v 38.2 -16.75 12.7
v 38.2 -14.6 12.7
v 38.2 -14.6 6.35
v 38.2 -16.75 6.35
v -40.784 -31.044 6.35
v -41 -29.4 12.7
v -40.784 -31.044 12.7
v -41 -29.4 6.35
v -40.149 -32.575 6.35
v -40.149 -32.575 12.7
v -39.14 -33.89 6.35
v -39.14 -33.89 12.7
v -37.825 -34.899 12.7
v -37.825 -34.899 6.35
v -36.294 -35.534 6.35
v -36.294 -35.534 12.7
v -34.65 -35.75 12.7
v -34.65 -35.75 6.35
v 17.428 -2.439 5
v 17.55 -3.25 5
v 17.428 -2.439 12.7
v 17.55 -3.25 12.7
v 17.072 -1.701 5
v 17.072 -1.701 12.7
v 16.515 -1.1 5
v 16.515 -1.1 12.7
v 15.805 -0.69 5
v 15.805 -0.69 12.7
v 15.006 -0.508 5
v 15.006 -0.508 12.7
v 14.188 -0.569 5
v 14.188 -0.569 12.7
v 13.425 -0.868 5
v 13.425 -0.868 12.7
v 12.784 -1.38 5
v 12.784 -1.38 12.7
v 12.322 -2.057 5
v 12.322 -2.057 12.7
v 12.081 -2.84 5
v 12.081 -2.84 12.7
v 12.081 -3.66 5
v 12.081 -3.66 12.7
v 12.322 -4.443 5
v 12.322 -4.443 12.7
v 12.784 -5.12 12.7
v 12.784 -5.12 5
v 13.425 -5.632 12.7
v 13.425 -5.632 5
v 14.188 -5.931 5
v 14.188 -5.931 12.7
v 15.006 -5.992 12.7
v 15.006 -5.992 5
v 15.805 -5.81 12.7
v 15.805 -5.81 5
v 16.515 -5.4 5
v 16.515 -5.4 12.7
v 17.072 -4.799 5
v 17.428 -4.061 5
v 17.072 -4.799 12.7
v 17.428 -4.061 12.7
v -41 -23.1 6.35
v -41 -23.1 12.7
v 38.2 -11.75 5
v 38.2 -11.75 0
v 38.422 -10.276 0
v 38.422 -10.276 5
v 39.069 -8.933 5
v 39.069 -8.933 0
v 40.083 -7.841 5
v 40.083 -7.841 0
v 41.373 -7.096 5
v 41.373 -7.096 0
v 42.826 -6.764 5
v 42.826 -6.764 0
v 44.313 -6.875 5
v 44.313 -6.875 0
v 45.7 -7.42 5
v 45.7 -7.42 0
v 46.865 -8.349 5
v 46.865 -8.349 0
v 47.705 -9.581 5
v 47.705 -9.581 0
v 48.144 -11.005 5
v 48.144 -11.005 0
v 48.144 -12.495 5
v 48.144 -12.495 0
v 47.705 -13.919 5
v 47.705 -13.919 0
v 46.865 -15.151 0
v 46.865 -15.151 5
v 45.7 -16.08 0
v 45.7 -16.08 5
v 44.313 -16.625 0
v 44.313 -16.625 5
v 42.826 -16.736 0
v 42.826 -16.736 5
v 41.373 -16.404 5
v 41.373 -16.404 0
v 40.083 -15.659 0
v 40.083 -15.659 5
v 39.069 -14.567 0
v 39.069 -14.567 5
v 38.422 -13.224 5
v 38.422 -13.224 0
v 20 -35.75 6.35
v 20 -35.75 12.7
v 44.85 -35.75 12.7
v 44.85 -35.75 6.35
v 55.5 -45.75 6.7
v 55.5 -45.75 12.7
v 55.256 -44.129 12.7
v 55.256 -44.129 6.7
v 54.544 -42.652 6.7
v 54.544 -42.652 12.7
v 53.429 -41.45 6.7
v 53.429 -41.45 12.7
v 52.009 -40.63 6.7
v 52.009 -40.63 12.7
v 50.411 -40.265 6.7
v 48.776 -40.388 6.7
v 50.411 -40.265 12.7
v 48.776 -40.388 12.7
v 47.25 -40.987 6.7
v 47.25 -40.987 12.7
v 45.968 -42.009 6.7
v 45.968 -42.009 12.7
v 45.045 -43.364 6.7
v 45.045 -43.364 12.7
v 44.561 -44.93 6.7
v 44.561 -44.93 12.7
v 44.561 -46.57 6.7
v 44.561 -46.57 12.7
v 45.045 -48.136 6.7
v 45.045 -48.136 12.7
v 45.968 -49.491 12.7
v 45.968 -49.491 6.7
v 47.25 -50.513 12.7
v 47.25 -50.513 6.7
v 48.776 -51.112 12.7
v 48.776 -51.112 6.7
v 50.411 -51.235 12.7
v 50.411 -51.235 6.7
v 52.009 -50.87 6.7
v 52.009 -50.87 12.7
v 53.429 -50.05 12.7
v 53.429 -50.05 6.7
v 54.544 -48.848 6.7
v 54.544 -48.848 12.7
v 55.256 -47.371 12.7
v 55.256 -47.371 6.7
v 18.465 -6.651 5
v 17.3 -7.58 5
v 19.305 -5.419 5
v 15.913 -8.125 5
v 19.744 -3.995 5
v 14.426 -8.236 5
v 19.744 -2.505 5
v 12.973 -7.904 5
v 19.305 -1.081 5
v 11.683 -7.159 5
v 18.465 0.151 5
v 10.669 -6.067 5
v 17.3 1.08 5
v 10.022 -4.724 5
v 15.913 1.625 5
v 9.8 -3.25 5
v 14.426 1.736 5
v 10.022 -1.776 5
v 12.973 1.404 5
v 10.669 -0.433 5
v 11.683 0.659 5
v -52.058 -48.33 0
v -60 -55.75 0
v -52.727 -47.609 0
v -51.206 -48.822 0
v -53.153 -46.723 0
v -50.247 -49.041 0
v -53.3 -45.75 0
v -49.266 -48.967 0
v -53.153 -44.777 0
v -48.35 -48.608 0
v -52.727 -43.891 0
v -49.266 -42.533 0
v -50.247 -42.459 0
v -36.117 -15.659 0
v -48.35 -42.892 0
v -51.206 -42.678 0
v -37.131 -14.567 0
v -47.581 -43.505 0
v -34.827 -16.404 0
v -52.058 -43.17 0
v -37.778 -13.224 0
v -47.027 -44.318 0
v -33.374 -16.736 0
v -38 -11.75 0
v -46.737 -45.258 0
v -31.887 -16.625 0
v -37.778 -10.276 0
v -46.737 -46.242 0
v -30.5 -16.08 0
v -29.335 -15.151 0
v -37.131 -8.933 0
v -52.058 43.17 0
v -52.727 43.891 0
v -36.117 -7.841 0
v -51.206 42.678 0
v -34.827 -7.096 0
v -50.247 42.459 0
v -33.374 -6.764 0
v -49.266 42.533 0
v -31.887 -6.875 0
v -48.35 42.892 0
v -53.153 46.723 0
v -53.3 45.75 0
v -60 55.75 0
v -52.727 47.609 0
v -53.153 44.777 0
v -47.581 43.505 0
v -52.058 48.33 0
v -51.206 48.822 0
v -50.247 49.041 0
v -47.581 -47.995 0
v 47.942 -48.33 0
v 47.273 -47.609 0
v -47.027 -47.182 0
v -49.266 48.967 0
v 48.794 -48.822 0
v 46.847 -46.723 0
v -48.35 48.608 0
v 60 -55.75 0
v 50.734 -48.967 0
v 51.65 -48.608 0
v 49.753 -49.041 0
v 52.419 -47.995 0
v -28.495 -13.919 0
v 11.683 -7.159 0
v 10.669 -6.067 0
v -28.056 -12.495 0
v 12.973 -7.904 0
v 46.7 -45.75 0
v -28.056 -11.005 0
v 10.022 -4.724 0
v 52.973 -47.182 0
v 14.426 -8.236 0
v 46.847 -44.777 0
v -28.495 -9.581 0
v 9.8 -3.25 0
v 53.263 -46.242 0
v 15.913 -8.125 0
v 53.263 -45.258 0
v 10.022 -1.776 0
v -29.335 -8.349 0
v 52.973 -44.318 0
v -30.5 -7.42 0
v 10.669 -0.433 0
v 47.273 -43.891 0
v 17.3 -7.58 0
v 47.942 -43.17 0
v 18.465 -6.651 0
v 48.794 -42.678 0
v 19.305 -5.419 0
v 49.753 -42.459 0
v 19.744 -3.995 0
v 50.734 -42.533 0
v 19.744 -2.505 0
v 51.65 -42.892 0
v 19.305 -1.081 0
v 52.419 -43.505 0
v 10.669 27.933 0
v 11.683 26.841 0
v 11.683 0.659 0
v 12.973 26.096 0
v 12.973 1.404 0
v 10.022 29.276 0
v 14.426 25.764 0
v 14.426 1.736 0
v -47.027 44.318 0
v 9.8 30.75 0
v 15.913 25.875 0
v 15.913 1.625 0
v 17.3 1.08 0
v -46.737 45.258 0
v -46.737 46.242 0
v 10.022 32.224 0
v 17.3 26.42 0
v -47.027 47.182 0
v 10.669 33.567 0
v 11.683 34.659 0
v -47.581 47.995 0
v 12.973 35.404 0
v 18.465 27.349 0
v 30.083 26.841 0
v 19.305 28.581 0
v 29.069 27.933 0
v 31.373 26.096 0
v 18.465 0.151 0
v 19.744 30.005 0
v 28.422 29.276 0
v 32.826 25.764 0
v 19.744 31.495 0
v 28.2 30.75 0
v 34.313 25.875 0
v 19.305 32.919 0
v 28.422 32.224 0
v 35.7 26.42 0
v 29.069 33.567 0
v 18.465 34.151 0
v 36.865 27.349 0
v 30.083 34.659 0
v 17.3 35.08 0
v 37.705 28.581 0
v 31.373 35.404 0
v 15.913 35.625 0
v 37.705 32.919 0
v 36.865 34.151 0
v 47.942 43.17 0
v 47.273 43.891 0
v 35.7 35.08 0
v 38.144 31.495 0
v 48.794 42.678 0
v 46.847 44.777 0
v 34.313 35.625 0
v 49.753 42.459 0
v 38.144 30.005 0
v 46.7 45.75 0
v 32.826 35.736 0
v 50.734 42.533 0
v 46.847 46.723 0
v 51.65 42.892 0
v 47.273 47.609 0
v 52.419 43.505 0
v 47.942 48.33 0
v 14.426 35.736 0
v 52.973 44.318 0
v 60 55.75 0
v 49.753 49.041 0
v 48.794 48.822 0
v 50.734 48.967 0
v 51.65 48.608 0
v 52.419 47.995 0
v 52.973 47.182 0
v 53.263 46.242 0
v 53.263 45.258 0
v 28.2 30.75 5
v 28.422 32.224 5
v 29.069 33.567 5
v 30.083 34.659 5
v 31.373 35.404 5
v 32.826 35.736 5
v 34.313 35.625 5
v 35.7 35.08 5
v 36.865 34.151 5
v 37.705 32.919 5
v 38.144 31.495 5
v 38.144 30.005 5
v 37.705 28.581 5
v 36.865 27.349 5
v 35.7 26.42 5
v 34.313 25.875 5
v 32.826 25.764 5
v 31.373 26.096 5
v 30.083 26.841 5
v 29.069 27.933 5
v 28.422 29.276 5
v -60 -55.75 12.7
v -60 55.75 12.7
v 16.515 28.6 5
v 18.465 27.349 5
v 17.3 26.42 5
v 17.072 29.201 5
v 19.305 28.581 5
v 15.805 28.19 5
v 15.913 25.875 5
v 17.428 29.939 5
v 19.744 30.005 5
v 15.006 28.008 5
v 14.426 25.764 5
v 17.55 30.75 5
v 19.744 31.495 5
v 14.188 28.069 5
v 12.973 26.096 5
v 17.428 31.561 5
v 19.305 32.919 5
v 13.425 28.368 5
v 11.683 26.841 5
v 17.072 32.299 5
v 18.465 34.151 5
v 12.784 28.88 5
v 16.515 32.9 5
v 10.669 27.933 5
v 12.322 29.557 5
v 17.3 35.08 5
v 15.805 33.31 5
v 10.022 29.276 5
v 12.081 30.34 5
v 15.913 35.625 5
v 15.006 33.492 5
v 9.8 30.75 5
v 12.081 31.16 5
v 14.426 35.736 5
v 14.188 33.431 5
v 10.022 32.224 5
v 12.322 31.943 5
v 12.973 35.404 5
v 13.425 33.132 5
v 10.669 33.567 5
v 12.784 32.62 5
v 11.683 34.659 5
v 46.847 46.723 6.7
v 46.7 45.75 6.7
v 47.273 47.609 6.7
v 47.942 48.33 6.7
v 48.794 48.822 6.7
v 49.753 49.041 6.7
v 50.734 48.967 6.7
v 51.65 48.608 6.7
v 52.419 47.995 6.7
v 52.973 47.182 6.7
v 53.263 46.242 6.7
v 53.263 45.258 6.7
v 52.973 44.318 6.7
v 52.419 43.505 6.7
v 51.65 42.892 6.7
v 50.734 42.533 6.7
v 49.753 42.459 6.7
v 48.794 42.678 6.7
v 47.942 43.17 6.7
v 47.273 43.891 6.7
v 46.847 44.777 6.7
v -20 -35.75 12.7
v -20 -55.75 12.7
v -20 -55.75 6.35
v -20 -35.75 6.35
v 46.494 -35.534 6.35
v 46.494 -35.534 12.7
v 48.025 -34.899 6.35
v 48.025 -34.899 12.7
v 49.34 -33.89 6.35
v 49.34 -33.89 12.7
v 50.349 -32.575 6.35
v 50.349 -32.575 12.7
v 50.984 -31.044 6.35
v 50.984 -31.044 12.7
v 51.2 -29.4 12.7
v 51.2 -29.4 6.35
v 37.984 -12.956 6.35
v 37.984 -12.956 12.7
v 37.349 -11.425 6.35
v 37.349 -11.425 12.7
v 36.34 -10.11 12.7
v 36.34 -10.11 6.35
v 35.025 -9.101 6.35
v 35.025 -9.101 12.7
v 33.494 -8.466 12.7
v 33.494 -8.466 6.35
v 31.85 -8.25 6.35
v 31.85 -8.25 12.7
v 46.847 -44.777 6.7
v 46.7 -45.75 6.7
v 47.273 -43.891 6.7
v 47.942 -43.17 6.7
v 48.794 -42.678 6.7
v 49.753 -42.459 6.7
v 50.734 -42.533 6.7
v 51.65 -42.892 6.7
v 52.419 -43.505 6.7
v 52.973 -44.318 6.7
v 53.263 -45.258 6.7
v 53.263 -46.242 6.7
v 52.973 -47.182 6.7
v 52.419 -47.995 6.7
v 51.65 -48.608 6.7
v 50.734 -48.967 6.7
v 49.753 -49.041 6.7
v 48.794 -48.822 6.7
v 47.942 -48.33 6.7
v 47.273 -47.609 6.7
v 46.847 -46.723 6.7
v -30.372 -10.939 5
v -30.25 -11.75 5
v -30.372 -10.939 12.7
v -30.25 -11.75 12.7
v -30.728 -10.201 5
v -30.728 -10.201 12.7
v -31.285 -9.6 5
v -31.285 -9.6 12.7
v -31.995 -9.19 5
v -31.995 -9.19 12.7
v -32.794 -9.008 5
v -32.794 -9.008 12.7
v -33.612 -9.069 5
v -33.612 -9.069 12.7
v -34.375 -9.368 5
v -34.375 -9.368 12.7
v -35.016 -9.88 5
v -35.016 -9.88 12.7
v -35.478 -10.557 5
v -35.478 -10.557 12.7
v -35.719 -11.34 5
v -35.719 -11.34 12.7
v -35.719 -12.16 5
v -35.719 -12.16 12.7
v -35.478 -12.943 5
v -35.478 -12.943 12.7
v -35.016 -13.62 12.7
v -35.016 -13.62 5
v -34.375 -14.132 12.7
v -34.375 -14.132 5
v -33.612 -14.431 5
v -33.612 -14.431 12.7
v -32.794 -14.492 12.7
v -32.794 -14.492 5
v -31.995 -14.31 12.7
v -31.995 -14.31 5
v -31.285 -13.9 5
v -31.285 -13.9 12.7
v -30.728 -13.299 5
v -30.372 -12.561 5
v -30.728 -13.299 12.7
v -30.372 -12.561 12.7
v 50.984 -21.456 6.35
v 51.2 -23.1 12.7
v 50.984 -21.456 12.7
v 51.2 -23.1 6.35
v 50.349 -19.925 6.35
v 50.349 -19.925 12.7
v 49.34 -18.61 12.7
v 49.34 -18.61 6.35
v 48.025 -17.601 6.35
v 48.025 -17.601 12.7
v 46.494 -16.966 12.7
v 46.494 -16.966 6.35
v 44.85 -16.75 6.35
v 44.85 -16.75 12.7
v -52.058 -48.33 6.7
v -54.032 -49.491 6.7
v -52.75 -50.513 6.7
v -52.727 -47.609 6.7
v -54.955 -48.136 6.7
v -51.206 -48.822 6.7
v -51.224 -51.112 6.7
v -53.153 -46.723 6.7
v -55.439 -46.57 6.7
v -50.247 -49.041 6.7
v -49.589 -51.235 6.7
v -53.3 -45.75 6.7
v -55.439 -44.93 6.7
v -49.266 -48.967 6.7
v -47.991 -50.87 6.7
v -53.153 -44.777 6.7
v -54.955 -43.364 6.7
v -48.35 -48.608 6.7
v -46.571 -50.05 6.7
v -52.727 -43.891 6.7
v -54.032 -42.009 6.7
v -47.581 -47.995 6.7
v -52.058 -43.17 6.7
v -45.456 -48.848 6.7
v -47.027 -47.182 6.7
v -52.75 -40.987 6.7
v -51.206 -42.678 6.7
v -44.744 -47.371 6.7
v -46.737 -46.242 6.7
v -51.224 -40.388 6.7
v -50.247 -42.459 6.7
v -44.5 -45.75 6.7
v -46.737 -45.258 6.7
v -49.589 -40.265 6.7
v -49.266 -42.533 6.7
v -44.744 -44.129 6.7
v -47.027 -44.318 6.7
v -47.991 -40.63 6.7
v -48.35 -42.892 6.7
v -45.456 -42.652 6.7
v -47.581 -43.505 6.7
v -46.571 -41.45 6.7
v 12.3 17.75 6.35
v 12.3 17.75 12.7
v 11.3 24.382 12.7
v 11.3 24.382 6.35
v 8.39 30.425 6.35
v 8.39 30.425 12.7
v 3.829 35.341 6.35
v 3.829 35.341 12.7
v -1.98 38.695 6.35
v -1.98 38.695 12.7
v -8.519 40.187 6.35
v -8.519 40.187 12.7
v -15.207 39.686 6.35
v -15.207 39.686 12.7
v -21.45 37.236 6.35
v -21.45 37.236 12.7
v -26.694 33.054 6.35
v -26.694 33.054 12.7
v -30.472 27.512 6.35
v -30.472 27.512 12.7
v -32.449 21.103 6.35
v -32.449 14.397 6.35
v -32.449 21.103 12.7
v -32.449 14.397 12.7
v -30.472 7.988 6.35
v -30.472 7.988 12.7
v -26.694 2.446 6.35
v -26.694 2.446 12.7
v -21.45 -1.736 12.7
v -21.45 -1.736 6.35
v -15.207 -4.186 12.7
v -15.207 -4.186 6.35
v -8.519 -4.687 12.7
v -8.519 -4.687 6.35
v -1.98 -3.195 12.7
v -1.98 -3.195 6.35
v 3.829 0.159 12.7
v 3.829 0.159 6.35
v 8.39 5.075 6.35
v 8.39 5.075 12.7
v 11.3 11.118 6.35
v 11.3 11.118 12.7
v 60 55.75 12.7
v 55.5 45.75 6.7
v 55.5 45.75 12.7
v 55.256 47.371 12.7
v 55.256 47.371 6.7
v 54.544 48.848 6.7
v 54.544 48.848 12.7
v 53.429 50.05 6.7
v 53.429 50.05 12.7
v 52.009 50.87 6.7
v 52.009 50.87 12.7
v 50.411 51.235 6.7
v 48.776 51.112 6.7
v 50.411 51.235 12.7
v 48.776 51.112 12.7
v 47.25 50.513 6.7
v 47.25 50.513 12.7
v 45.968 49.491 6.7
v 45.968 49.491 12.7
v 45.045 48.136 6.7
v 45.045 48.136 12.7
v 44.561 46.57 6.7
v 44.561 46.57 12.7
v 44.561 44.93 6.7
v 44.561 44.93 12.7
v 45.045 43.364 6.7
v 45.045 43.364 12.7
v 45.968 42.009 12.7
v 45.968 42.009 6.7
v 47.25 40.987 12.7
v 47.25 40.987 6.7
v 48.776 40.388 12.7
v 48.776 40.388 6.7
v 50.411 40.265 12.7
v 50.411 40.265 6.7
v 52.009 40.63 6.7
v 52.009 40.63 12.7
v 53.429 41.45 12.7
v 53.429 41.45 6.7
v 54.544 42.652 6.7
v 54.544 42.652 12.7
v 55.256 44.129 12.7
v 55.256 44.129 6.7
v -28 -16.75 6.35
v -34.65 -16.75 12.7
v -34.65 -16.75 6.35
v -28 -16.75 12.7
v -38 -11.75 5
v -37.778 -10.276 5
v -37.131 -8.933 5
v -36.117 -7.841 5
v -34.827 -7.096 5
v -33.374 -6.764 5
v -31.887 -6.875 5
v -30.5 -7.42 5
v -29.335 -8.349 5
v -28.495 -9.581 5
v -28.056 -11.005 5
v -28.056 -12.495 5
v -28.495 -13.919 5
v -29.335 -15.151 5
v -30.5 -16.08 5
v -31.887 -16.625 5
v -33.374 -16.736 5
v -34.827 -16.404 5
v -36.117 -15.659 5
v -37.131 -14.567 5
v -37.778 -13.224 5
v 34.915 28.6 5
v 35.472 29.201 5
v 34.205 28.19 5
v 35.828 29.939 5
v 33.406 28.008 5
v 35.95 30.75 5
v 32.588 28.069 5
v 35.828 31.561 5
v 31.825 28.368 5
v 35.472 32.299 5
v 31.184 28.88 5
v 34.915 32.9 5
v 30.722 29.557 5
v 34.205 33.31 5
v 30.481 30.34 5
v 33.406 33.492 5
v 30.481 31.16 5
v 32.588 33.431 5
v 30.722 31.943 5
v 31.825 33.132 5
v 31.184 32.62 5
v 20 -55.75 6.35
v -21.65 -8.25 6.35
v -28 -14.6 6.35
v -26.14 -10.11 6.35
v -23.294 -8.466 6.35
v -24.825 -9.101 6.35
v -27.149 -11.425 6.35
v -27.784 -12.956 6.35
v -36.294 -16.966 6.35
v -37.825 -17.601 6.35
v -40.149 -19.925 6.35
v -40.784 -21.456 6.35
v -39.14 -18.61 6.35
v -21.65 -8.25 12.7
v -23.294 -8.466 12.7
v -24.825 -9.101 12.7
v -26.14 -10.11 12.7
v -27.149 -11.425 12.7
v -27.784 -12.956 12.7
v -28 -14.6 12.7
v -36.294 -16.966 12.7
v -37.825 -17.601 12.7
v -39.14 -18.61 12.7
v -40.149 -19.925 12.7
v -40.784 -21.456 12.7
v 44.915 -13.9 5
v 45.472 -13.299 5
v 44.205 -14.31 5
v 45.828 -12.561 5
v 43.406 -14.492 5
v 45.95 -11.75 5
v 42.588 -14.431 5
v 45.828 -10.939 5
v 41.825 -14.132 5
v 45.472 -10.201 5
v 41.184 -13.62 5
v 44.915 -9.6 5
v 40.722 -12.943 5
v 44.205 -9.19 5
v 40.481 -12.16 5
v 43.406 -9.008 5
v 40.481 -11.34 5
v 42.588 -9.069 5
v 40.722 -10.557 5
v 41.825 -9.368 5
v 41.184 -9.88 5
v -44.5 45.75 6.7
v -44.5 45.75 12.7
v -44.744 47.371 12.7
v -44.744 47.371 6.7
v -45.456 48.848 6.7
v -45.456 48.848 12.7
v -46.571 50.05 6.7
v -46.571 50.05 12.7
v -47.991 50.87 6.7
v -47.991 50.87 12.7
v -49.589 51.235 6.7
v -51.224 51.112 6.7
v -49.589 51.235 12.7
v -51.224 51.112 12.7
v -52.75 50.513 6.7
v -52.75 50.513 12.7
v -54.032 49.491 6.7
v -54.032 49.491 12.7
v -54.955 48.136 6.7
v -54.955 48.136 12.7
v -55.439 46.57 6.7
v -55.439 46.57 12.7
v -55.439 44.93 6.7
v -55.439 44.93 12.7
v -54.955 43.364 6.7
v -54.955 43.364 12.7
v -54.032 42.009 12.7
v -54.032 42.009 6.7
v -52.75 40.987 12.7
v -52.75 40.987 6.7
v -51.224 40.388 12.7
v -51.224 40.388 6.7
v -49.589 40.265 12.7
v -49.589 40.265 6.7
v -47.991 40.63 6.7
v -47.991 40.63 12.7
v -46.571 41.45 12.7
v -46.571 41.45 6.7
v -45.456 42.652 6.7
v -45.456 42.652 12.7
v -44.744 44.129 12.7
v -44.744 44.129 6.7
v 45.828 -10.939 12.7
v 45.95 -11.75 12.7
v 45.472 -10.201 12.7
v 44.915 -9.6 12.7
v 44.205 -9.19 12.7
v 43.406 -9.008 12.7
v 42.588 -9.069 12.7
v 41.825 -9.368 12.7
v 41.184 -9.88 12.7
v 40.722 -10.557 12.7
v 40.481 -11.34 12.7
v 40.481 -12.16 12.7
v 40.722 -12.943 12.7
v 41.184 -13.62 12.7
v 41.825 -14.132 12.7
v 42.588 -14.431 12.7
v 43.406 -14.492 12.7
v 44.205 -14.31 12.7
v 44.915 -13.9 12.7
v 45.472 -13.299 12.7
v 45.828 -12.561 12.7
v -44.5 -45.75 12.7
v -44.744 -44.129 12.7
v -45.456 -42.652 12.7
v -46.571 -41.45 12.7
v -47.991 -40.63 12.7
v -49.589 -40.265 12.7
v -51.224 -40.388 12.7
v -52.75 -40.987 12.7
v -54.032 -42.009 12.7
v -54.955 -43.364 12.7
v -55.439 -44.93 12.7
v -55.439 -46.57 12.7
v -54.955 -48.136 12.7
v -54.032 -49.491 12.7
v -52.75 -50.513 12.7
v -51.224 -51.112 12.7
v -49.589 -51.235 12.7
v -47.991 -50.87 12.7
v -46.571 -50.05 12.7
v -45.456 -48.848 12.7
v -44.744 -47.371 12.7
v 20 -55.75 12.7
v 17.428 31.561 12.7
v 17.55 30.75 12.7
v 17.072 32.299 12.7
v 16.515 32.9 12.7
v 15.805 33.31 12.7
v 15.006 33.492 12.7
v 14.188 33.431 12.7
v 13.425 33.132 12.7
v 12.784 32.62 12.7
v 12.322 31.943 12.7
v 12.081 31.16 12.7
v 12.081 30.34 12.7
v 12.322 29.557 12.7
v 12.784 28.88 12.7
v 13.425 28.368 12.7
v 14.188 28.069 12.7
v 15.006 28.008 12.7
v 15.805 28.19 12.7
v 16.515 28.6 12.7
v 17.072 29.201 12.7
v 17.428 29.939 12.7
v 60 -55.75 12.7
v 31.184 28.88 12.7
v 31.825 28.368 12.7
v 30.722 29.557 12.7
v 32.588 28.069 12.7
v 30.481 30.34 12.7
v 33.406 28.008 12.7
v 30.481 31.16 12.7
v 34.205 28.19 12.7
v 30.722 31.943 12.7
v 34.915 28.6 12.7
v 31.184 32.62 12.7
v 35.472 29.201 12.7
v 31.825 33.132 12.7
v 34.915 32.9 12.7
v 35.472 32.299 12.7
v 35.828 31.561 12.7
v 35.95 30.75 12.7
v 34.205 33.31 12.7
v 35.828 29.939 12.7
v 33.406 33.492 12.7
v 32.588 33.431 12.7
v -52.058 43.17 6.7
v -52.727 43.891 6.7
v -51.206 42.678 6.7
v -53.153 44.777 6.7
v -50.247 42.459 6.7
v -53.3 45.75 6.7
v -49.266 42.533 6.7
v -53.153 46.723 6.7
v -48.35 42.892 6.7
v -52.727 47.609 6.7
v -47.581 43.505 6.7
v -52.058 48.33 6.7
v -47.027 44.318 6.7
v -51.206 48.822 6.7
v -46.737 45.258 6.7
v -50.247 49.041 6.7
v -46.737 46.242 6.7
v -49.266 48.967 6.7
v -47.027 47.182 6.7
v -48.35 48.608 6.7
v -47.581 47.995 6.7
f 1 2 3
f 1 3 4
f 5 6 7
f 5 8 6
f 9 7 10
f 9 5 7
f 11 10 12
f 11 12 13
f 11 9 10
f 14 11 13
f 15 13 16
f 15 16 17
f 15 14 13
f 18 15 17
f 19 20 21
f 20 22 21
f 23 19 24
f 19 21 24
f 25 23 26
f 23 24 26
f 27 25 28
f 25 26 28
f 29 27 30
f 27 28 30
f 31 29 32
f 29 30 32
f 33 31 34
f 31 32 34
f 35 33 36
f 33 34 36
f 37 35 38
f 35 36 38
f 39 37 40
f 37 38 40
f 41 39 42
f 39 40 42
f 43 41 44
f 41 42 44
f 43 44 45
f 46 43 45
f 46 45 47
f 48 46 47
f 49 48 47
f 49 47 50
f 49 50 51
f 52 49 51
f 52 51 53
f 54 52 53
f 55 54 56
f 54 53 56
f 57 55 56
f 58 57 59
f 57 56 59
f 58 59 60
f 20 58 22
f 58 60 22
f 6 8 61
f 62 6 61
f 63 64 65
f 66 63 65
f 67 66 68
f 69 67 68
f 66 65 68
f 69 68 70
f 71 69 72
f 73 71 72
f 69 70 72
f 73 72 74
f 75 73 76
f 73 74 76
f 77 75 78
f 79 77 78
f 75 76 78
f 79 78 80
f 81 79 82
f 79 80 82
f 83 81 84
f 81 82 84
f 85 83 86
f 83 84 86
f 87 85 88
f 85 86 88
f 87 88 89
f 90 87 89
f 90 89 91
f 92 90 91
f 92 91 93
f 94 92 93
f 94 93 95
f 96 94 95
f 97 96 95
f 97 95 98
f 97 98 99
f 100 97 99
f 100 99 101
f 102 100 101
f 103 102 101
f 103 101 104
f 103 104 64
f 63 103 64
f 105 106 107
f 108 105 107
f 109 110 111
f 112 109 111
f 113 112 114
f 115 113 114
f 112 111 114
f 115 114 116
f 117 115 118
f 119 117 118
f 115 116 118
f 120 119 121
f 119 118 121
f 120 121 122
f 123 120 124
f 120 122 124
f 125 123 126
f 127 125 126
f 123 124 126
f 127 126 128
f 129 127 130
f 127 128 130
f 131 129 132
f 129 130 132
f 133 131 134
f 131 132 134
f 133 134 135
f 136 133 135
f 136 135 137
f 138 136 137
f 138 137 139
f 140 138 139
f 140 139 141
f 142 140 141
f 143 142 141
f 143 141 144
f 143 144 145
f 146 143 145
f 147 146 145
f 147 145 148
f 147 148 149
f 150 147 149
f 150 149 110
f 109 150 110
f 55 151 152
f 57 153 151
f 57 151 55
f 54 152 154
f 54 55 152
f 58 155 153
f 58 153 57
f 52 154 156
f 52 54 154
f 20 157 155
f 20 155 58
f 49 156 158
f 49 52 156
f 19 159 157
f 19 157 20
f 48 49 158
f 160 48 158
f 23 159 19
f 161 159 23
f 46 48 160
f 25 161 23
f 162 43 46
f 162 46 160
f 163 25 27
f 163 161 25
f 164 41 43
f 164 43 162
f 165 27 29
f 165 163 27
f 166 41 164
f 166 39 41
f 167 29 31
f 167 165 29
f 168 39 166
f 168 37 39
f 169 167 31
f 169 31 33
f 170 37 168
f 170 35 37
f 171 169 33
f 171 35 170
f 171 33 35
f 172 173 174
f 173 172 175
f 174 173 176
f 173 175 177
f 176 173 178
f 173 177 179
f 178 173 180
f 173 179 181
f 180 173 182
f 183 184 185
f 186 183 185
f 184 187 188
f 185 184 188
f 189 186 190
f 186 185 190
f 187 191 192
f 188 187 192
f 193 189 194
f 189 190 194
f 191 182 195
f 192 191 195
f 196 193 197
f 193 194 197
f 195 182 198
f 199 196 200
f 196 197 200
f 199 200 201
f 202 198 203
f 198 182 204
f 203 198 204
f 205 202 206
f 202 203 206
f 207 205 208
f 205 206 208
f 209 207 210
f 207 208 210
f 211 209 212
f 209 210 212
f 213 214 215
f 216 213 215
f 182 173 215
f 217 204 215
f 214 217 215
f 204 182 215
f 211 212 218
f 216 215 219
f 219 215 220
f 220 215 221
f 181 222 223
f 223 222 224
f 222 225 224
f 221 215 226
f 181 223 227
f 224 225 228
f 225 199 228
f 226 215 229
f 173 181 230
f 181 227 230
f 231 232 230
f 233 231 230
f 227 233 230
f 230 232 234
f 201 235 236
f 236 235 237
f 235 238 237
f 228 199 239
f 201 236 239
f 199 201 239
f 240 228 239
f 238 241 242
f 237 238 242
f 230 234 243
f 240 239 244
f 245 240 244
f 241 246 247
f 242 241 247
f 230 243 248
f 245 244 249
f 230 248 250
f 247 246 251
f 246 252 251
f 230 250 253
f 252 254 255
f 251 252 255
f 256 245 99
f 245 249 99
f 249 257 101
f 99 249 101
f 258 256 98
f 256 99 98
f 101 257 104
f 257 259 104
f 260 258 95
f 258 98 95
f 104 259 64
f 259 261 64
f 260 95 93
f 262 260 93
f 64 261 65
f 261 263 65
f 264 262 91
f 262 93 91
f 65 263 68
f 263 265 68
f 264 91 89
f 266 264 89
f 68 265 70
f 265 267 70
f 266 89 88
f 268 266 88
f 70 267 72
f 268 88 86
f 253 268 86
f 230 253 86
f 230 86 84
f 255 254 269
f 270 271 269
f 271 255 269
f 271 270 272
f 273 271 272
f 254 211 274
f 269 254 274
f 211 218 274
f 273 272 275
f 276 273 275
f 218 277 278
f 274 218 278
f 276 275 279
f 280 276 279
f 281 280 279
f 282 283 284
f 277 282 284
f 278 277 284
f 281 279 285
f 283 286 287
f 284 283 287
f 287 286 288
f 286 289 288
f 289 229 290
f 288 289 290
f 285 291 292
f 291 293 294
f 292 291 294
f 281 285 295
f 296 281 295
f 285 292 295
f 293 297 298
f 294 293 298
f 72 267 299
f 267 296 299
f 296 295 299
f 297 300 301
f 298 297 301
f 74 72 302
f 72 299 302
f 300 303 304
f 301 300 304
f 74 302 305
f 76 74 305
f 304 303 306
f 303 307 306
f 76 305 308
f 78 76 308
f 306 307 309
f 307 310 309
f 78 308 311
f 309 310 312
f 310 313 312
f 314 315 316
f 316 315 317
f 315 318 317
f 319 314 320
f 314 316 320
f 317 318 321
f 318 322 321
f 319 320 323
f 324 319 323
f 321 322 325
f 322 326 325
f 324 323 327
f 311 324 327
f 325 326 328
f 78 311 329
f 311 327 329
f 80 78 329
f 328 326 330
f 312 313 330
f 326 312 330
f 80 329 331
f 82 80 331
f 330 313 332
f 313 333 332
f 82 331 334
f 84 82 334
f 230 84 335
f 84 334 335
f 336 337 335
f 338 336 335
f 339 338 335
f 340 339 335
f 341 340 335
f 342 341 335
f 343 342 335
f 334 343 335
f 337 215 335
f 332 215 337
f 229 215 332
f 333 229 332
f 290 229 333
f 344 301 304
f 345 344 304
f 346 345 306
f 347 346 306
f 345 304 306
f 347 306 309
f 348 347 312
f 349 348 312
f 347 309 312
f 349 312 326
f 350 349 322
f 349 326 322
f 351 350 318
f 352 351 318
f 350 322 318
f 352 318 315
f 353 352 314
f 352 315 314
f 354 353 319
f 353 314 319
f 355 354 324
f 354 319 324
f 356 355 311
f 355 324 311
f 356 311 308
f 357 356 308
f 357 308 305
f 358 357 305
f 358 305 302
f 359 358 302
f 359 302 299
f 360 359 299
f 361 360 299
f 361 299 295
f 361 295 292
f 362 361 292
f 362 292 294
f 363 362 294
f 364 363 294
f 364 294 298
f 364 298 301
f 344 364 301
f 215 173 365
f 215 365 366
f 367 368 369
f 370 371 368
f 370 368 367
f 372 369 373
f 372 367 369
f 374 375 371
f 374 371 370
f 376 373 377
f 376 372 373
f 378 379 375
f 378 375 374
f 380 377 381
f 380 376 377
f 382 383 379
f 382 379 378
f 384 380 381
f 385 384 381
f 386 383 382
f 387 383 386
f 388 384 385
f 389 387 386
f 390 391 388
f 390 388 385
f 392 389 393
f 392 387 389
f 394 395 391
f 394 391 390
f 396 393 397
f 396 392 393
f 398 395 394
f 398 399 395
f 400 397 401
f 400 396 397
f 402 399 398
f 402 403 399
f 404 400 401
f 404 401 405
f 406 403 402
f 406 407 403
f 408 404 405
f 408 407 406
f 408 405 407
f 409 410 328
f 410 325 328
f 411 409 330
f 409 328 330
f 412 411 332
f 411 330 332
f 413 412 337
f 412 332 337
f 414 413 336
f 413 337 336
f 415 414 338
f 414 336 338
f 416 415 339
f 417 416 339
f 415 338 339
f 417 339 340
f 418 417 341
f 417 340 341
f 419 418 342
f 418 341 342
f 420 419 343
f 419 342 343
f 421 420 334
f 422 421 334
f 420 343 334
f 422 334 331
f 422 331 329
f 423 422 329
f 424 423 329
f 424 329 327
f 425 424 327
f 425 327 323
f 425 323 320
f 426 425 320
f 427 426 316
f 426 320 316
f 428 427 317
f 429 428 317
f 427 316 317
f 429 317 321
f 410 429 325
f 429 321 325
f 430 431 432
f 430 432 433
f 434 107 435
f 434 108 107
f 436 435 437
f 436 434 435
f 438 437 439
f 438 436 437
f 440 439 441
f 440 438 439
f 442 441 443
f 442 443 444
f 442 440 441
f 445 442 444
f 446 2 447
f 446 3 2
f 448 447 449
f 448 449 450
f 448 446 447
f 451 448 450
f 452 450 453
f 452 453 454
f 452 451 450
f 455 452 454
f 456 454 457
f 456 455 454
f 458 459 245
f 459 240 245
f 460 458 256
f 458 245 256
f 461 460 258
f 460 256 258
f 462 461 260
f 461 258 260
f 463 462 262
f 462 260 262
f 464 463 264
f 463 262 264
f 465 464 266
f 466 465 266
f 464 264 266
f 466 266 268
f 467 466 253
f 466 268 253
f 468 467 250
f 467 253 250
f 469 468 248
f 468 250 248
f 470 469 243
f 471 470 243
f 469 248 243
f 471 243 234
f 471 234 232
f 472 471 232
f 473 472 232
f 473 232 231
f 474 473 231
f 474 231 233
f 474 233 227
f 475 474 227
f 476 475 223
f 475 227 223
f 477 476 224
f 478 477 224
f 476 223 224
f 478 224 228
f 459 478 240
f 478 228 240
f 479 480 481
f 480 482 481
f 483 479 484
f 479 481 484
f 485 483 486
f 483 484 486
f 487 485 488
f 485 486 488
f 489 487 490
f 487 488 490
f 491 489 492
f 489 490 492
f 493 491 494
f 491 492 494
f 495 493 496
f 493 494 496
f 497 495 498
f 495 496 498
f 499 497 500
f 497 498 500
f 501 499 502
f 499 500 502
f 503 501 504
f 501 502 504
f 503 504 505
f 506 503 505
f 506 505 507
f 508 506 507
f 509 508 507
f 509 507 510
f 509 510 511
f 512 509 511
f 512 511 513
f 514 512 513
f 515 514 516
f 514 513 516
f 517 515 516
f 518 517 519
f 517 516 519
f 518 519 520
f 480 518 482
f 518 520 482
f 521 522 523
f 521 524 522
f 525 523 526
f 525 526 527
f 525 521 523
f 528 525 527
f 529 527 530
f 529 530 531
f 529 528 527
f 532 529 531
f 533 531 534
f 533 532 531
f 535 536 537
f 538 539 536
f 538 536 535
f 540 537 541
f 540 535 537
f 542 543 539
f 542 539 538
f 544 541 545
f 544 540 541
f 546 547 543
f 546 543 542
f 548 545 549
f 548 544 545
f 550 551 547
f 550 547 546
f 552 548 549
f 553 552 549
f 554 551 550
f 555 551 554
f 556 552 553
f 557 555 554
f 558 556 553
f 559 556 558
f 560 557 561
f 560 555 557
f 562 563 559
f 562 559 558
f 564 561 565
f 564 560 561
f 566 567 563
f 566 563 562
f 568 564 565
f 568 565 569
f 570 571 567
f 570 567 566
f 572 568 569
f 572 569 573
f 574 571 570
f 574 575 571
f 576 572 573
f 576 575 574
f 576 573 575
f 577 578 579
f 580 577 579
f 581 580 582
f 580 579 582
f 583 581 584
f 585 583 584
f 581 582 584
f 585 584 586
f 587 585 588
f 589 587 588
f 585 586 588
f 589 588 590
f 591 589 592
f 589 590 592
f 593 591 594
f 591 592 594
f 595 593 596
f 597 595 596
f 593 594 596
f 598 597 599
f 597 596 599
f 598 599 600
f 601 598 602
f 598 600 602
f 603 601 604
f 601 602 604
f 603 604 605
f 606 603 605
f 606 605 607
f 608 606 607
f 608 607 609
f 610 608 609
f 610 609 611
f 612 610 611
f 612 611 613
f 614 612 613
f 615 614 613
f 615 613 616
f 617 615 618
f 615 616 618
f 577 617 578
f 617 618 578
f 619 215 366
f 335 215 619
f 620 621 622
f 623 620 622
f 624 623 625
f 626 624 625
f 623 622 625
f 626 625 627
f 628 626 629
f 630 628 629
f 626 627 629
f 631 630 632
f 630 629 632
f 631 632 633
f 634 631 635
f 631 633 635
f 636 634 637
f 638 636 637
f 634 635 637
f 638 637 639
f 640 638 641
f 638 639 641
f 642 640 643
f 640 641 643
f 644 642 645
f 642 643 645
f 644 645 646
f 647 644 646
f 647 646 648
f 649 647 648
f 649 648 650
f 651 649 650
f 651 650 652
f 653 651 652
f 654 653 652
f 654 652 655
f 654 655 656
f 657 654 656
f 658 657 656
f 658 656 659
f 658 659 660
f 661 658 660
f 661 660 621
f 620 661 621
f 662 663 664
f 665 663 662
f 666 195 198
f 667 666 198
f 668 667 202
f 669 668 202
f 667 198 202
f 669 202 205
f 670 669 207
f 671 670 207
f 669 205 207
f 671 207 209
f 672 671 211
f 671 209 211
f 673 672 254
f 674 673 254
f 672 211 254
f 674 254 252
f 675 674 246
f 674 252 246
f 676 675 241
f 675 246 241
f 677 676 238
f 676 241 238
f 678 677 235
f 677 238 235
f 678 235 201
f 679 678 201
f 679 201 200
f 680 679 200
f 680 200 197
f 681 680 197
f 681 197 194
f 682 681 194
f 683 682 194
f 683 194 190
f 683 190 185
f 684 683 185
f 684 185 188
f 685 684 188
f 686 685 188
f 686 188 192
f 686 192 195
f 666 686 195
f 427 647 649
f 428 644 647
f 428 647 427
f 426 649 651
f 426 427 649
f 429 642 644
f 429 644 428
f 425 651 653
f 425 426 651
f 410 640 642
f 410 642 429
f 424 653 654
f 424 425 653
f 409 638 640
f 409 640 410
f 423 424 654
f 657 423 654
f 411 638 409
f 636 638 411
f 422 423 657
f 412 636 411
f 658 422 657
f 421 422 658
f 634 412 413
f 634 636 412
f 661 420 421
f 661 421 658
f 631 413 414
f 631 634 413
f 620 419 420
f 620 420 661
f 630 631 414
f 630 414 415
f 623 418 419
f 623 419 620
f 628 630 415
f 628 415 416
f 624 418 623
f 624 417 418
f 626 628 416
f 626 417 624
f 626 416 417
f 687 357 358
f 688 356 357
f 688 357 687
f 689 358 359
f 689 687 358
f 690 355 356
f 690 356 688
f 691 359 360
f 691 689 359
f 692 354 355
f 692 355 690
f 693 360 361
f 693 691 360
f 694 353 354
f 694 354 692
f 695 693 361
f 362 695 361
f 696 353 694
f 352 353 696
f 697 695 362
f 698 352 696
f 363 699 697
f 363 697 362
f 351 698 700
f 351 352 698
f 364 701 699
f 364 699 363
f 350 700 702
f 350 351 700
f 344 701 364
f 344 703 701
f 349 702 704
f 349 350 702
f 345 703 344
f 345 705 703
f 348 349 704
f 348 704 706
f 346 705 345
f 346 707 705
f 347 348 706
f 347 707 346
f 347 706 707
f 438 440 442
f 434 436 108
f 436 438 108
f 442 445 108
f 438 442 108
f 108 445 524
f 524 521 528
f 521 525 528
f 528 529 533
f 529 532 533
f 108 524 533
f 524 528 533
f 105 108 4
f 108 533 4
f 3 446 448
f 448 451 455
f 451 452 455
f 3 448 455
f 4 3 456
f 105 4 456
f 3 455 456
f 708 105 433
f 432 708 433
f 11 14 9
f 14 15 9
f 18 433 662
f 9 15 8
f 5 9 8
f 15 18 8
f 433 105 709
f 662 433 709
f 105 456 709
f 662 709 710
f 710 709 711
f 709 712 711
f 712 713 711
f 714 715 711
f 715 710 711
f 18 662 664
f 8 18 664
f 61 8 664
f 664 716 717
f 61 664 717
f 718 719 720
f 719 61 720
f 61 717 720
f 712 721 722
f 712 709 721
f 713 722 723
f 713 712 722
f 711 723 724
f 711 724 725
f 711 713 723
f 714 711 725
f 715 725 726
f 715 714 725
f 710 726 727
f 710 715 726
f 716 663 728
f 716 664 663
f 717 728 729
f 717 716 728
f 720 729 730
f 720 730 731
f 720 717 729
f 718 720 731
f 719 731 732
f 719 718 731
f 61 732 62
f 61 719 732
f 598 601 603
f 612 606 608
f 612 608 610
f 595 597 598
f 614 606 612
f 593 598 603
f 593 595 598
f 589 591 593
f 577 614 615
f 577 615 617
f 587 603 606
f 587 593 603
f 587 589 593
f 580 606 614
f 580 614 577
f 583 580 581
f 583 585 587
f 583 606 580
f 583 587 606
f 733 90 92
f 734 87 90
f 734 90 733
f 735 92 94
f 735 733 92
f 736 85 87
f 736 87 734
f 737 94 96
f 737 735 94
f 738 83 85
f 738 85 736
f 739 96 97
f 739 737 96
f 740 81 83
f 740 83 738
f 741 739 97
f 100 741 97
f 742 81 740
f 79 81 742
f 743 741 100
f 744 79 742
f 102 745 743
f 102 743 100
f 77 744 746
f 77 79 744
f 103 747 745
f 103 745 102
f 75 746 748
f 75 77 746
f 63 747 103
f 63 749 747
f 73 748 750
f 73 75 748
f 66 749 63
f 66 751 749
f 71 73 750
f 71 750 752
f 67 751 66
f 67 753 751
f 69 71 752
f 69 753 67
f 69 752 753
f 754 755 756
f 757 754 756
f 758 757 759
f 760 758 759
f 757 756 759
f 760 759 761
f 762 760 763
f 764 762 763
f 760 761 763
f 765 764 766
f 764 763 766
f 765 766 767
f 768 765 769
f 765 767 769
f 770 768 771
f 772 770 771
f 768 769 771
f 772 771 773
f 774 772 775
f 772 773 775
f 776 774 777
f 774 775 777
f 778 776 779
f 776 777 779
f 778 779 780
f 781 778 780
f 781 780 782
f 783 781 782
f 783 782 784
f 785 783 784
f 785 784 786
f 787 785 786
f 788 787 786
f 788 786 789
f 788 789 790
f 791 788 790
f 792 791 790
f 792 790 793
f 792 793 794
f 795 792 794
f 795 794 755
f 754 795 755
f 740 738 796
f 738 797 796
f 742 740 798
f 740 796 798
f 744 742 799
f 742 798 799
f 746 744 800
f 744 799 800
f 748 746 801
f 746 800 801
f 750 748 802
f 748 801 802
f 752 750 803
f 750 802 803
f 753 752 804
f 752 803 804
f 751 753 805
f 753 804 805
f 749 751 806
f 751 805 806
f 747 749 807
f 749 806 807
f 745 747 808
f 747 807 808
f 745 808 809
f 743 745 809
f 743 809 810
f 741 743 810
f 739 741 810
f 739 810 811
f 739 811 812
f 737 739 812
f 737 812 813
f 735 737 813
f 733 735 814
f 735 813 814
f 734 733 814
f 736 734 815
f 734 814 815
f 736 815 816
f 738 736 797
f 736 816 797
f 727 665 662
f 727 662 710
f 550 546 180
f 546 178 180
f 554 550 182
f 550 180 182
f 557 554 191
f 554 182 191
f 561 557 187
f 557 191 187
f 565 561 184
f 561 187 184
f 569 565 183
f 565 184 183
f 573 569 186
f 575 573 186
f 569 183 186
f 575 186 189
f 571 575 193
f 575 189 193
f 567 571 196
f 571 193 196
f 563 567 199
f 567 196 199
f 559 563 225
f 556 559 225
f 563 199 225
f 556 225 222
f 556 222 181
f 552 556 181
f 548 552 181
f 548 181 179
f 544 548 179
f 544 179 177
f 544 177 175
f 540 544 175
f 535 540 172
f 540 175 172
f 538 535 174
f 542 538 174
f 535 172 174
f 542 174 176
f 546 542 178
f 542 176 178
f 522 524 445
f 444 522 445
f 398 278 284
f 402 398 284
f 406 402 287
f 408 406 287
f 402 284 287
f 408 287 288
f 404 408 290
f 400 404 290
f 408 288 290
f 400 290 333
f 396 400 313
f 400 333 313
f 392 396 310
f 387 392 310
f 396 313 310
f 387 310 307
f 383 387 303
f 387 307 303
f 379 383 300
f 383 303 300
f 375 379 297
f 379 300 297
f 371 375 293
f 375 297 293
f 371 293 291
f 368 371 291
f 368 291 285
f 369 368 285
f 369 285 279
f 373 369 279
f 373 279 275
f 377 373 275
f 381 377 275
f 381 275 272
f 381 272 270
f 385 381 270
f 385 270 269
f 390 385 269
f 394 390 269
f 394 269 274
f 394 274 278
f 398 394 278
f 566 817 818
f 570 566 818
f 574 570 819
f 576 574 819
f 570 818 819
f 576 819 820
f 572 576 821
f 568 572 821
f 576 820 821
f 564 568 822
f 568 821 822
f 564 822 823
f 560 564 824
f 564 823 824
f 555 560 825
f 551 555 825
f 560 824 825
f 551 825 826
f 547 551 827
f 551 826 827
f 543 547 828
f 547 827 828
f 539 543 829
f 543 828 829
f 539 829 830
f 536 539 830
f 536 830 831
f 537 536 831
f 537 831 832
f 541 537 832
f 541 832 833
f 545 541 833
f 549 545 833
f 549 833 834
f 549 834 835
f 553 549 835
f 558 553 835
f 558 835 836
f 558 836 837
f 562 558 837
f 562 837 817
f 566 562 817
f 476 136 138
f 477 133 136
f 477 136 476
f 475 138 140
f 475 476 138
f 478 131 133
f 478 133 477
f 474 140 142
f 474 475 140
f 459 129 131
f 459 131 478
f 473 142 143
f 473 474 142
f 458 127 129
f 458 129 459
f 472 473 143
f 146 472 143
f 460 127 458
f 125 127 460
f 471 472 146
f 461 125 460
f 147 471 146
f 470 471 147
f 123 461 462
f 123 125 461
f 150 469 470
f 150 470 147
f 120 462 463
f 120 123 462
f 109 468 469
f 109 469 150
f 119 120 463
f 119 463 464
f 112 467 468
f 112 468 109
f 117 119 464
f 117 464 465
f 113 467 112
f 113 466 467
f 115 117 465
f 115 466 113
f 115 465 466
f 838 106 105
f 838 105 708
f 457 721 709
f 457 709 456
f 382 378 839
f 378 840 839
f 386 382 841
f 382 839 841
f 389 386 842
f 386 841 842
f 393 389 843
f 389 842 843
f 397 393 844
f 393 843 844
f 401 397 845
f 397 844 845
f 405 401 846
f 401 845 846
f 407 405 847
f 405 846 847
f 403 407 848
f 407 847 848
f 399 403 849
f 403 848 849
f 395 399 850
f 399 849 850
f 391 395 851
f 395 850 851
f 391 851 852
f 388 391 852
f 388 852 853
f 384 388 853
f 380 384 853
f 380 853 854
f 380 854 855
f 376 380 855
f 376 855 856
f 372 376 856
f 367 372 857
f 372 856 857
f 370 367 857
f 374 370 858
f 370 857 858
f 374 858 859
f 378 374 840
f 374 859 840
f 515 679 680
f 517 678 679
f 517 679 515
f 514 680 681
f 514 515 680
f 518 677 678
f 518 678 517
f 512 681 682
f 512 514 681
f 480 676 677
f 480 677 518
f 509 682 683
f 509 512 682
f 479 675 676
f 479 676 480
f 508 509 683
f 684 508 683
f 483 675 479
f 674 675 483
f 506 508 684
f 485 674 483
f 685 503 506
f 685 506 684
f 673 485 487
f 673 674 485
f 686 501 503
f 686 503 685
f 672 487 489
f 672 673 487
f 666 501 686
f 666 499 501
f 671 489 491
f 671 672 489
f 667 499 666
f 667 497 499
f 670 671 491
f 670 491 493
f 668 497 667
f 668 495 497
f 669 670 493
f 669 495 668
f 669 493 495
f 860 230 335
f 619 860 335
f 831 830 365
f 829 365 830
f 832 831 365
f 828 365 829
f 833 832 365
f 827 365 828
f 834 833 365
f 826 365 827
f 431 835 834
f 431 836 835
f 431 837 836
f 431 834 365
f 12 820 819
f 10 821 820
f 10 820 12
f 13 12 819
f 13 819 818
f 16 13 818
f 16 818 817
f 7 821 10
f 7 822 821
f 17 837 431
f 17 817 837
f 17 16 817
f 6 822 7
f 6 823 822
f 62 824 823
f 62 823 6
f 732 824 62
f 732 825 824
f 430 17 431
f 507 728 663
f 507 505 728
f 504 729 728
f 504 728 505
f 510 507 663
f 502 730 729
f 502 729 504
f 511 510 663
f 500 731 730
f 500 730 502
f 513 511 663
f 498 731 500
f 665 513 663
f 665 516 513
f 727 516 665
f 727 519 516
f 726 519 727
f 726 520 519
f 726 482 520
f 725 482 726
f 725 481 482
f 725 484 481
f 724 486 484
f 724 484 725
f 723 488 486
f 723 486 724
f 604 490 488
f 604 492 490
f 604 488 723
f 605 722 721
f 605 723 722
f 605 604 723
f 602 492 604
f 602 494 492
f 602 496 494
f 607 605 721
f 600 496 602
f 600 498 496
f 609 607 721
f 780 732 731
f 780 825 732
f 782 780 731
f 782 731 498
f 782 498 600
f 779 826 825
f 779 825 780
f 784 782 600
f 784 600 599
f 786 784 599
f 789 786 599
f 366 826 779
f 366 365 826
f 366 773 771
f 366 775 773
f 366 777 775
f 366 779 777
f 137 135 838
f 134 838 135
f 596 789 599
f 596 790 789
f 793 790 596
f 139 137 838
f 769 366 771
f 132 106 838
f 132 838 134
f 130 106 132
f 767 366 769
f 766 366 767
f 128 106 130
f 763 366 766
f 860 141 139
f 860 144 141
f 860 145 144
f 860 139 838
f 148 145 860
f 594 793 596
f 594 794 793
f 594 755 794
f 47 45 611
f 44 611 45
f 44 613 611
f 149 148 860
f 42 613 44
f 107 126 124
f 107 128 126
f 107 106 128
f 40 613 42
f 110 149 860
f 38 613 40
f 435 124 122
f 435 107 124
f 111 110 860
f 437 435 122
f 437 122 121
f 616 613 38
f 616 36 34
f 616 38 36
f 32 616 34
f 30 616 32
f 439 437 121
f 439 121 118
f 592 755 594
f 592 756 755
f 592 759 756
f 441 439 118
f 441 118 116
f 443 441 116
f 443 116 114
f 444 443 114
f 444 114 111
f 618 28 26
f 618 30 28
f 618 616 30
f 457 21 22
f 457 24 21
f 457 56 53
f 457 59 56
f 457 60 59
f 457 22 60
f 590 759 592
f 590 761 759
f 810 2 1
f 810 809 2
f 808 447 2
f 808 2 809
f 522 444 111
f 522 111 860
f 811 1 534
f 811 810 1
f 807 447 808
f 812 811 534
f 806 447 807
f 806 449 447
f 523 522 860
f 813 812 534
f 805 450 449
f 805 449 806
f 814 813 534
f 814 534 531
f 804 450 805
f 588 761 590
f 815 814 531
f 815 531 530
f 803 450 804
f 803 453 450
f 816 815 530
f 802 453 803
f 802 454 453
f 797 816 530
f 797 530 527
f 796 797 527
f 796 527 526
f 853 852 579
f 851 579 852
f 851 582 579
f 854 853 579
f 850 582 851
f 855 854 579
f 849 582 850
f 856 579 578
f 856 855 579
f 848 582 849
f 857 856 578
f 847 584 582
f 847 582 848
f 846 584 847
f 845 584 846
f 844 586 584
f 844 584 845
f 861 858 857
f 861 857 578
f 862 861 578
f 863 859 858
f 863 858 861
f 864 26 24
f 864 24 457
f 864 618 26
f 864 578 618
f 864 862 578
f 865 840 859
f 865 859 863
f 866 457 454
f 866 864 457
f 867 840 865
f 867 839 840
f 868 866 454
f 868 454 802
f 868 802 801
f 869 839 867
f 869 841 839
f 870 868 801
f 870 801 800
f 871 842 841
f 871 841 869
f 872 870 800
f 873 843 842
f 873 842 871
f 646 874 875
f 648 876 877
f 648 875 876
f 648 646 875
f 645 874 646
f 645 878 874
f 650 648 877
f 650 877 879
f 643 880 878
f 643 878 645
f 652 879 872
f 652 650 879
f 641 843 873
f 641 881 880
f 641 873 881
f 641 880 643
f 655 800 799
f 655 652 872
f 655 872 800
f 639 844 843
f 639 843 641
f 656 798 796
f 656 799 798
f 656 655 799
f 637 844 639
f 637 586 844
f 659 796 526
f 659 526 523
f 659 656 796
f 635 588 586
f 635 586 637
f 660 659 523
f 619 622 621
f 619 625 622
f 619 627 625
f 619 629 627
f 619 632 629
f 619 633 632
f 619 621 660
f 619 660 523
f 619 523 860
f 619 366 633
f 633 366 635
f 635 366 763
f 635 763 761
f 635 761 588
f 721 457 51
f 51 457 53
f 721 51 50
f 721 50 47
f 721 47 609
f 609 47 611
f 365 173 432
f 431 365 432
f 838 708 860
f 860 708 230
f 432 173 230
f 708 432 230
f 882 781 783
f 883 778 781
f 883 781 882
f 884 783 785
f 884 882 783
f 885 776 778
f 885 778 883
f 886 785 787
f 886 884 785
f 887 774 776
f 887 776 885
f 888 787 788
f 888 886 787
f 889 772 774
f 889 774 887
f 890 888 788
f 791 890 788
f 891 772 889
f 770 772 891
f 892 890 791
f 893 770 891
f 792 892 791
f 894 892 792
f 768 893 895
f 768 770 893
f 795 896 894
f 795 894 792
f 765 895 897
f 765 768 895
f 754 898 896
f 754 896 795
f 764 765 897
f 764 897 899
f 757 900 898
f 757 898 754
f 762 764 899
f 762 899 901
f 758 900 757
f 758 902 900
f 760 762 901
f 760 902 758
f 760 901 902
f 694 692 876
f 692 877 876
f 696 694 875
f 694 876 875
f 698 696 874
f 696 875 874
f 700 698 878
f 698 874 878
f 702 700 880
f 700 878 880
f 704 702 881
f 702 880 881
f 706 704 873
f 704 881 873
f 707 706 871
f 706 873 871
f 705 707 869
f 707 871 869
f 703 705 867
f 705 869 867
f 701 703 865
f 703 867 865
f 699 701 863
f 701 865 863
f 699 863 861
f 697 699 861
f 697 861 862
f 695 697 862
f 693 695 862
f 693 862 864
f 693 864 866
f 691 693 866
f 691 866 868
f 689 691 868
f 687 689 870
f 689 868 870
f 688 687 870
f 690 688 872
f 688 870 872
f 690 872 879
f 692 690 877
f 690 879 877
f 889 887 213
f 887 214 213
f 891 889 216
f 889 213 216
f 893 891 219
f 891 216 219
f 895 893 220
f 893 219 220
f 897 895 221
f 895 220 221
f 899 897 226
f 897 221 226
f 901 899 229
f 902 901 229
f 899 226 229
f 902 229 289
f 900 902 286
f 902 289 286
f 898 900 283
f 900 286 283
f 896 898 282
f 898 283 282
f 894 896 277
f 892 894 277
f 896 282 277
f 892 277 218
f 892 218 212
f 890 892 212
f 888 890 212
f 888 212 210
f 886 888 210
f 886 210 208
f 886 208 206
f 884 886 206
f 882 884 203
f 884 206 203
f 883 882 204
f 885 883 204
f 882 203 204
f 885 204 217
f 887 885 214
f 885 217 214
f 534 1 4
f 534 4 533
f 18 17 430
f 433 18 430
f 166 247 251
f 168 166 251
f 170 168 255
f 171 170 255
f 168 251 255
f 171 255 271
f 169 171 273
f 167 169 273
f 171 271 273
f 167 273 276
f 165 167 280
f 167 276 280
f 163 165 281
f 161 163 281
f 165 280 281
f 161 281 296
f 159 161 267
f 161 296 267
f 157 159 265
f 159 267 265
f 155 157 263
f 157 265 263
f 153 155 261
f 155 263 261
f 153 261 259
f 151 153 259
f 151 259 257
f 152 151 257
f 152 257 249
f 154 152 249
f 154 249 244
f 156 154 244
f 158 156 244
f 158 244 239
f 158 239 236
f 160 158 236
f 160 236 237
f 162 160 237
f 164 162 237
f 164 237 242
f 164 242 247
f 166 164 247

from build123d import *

# Parameters (mm, degrees)
SKETCH1_W                      = 120
SKETCH1_H                      = 111.5
BOSS_EXTRUDE1_DEPTH            = 12.7
SKETCH2_R                      = 22.5
CUT_EXTRUDE1_DEPTH             = 6.35
FILLET1_R                      = 6.35
CBORE_FOR_M5_SHCS1_D           = 5.5
CBORE_FOR_M5_SHCS1_CBORE_D     = 10
CBORE_FOR_M5_SHCS1_CBORE_DEPTH = 5
CBORE_FOR_M6_SHCS1_D           = 6.6
CBORE_FOR_M6_SHCS1_CBORE_D     = 11
CBORE_FOR_M6_SHCS1_CBORE_DEPTH = 6


with BuildPart() as part:
    # Sketch1 → Boss-Extrude1 (new body)
    with BuildSketch(Plane.XY):
        Rectangle(SKETCH1_W, SKETCH1_H)
    extrude(amount=BOSS_EXTRUDE1_DEPTH)

    # Sketch2 → Cut-Extrude1 (cut)
    with BuildSketch(Plane.XY.offset(12.7)):
        with Locations((-10.2, 17.75)):
            Circle(SKETCH2_R)
        Polygon((38.2, -8.25), (38.2, -16.75), (51.2, -16.75), (51.2, -35.75), (38.2, -35.75), (20, -35.75), (20, -55.75), (-20, -55.75), (-20, -35.75), (-28, -35.75), (-41, -35.75), (-41, -16.75), (-28, -16.75), (-28, -8.25), align=None)
    extrude(amount=-CUT_EXTRUDE1_DEPTH, mode=Mode.SUBTRACT)

    # Fillet1
    fillet1_edges = [part.edges().sort_by_distance(p)[0] for p in [
        (-28, -8.25, 9.525),
        (38.2, -8.25, 9.525),
        (51.2, -16.75, 9.525),
        (51.2, -35.75, 9.525),
        (-41, -35.75, 9.525),
        (-41, -16.75, 9.525),
    ]]
    fillet(fillet1_edges, radius=FILLET1_R)

    # CBORE for M5 SHCS1 (through all)
    with Locations(Plane(origin=(0, 0, 0), x_dir=(-1, 0, 0), z_dir=(0, 0, -1))):
        with Locations((-33.2, 30.75), (-14.8, 30.75), (-14.8, -3.25), (-43.2, -11.75), (33, -11.75)):
            CounterBoreHole(CBORE_FOR_M5_SHCS1_D / 2, CBORE_FOR_M5_SHCS1_CBORE_D / 2, CBORE_FOR_M5_SHCS1_CBORE_DEPTH)

    # CBORE for M6 SHCS1 (through all)
    with Locations(Plane.XY.offset(12.7)):
        with Locations((-50, 45.75), (50, 45.75), (50, -45.75), (-50, -45.75)):
            CounterBoreHole(CBORE_FOR_M6_SHCS1_D / 2, CBORE_FOR_M6_SHCS1_CBORE_D / 2, CBORE_FOR_M6_SHCS1_CBORE_DEPTH)


solid = part.part
